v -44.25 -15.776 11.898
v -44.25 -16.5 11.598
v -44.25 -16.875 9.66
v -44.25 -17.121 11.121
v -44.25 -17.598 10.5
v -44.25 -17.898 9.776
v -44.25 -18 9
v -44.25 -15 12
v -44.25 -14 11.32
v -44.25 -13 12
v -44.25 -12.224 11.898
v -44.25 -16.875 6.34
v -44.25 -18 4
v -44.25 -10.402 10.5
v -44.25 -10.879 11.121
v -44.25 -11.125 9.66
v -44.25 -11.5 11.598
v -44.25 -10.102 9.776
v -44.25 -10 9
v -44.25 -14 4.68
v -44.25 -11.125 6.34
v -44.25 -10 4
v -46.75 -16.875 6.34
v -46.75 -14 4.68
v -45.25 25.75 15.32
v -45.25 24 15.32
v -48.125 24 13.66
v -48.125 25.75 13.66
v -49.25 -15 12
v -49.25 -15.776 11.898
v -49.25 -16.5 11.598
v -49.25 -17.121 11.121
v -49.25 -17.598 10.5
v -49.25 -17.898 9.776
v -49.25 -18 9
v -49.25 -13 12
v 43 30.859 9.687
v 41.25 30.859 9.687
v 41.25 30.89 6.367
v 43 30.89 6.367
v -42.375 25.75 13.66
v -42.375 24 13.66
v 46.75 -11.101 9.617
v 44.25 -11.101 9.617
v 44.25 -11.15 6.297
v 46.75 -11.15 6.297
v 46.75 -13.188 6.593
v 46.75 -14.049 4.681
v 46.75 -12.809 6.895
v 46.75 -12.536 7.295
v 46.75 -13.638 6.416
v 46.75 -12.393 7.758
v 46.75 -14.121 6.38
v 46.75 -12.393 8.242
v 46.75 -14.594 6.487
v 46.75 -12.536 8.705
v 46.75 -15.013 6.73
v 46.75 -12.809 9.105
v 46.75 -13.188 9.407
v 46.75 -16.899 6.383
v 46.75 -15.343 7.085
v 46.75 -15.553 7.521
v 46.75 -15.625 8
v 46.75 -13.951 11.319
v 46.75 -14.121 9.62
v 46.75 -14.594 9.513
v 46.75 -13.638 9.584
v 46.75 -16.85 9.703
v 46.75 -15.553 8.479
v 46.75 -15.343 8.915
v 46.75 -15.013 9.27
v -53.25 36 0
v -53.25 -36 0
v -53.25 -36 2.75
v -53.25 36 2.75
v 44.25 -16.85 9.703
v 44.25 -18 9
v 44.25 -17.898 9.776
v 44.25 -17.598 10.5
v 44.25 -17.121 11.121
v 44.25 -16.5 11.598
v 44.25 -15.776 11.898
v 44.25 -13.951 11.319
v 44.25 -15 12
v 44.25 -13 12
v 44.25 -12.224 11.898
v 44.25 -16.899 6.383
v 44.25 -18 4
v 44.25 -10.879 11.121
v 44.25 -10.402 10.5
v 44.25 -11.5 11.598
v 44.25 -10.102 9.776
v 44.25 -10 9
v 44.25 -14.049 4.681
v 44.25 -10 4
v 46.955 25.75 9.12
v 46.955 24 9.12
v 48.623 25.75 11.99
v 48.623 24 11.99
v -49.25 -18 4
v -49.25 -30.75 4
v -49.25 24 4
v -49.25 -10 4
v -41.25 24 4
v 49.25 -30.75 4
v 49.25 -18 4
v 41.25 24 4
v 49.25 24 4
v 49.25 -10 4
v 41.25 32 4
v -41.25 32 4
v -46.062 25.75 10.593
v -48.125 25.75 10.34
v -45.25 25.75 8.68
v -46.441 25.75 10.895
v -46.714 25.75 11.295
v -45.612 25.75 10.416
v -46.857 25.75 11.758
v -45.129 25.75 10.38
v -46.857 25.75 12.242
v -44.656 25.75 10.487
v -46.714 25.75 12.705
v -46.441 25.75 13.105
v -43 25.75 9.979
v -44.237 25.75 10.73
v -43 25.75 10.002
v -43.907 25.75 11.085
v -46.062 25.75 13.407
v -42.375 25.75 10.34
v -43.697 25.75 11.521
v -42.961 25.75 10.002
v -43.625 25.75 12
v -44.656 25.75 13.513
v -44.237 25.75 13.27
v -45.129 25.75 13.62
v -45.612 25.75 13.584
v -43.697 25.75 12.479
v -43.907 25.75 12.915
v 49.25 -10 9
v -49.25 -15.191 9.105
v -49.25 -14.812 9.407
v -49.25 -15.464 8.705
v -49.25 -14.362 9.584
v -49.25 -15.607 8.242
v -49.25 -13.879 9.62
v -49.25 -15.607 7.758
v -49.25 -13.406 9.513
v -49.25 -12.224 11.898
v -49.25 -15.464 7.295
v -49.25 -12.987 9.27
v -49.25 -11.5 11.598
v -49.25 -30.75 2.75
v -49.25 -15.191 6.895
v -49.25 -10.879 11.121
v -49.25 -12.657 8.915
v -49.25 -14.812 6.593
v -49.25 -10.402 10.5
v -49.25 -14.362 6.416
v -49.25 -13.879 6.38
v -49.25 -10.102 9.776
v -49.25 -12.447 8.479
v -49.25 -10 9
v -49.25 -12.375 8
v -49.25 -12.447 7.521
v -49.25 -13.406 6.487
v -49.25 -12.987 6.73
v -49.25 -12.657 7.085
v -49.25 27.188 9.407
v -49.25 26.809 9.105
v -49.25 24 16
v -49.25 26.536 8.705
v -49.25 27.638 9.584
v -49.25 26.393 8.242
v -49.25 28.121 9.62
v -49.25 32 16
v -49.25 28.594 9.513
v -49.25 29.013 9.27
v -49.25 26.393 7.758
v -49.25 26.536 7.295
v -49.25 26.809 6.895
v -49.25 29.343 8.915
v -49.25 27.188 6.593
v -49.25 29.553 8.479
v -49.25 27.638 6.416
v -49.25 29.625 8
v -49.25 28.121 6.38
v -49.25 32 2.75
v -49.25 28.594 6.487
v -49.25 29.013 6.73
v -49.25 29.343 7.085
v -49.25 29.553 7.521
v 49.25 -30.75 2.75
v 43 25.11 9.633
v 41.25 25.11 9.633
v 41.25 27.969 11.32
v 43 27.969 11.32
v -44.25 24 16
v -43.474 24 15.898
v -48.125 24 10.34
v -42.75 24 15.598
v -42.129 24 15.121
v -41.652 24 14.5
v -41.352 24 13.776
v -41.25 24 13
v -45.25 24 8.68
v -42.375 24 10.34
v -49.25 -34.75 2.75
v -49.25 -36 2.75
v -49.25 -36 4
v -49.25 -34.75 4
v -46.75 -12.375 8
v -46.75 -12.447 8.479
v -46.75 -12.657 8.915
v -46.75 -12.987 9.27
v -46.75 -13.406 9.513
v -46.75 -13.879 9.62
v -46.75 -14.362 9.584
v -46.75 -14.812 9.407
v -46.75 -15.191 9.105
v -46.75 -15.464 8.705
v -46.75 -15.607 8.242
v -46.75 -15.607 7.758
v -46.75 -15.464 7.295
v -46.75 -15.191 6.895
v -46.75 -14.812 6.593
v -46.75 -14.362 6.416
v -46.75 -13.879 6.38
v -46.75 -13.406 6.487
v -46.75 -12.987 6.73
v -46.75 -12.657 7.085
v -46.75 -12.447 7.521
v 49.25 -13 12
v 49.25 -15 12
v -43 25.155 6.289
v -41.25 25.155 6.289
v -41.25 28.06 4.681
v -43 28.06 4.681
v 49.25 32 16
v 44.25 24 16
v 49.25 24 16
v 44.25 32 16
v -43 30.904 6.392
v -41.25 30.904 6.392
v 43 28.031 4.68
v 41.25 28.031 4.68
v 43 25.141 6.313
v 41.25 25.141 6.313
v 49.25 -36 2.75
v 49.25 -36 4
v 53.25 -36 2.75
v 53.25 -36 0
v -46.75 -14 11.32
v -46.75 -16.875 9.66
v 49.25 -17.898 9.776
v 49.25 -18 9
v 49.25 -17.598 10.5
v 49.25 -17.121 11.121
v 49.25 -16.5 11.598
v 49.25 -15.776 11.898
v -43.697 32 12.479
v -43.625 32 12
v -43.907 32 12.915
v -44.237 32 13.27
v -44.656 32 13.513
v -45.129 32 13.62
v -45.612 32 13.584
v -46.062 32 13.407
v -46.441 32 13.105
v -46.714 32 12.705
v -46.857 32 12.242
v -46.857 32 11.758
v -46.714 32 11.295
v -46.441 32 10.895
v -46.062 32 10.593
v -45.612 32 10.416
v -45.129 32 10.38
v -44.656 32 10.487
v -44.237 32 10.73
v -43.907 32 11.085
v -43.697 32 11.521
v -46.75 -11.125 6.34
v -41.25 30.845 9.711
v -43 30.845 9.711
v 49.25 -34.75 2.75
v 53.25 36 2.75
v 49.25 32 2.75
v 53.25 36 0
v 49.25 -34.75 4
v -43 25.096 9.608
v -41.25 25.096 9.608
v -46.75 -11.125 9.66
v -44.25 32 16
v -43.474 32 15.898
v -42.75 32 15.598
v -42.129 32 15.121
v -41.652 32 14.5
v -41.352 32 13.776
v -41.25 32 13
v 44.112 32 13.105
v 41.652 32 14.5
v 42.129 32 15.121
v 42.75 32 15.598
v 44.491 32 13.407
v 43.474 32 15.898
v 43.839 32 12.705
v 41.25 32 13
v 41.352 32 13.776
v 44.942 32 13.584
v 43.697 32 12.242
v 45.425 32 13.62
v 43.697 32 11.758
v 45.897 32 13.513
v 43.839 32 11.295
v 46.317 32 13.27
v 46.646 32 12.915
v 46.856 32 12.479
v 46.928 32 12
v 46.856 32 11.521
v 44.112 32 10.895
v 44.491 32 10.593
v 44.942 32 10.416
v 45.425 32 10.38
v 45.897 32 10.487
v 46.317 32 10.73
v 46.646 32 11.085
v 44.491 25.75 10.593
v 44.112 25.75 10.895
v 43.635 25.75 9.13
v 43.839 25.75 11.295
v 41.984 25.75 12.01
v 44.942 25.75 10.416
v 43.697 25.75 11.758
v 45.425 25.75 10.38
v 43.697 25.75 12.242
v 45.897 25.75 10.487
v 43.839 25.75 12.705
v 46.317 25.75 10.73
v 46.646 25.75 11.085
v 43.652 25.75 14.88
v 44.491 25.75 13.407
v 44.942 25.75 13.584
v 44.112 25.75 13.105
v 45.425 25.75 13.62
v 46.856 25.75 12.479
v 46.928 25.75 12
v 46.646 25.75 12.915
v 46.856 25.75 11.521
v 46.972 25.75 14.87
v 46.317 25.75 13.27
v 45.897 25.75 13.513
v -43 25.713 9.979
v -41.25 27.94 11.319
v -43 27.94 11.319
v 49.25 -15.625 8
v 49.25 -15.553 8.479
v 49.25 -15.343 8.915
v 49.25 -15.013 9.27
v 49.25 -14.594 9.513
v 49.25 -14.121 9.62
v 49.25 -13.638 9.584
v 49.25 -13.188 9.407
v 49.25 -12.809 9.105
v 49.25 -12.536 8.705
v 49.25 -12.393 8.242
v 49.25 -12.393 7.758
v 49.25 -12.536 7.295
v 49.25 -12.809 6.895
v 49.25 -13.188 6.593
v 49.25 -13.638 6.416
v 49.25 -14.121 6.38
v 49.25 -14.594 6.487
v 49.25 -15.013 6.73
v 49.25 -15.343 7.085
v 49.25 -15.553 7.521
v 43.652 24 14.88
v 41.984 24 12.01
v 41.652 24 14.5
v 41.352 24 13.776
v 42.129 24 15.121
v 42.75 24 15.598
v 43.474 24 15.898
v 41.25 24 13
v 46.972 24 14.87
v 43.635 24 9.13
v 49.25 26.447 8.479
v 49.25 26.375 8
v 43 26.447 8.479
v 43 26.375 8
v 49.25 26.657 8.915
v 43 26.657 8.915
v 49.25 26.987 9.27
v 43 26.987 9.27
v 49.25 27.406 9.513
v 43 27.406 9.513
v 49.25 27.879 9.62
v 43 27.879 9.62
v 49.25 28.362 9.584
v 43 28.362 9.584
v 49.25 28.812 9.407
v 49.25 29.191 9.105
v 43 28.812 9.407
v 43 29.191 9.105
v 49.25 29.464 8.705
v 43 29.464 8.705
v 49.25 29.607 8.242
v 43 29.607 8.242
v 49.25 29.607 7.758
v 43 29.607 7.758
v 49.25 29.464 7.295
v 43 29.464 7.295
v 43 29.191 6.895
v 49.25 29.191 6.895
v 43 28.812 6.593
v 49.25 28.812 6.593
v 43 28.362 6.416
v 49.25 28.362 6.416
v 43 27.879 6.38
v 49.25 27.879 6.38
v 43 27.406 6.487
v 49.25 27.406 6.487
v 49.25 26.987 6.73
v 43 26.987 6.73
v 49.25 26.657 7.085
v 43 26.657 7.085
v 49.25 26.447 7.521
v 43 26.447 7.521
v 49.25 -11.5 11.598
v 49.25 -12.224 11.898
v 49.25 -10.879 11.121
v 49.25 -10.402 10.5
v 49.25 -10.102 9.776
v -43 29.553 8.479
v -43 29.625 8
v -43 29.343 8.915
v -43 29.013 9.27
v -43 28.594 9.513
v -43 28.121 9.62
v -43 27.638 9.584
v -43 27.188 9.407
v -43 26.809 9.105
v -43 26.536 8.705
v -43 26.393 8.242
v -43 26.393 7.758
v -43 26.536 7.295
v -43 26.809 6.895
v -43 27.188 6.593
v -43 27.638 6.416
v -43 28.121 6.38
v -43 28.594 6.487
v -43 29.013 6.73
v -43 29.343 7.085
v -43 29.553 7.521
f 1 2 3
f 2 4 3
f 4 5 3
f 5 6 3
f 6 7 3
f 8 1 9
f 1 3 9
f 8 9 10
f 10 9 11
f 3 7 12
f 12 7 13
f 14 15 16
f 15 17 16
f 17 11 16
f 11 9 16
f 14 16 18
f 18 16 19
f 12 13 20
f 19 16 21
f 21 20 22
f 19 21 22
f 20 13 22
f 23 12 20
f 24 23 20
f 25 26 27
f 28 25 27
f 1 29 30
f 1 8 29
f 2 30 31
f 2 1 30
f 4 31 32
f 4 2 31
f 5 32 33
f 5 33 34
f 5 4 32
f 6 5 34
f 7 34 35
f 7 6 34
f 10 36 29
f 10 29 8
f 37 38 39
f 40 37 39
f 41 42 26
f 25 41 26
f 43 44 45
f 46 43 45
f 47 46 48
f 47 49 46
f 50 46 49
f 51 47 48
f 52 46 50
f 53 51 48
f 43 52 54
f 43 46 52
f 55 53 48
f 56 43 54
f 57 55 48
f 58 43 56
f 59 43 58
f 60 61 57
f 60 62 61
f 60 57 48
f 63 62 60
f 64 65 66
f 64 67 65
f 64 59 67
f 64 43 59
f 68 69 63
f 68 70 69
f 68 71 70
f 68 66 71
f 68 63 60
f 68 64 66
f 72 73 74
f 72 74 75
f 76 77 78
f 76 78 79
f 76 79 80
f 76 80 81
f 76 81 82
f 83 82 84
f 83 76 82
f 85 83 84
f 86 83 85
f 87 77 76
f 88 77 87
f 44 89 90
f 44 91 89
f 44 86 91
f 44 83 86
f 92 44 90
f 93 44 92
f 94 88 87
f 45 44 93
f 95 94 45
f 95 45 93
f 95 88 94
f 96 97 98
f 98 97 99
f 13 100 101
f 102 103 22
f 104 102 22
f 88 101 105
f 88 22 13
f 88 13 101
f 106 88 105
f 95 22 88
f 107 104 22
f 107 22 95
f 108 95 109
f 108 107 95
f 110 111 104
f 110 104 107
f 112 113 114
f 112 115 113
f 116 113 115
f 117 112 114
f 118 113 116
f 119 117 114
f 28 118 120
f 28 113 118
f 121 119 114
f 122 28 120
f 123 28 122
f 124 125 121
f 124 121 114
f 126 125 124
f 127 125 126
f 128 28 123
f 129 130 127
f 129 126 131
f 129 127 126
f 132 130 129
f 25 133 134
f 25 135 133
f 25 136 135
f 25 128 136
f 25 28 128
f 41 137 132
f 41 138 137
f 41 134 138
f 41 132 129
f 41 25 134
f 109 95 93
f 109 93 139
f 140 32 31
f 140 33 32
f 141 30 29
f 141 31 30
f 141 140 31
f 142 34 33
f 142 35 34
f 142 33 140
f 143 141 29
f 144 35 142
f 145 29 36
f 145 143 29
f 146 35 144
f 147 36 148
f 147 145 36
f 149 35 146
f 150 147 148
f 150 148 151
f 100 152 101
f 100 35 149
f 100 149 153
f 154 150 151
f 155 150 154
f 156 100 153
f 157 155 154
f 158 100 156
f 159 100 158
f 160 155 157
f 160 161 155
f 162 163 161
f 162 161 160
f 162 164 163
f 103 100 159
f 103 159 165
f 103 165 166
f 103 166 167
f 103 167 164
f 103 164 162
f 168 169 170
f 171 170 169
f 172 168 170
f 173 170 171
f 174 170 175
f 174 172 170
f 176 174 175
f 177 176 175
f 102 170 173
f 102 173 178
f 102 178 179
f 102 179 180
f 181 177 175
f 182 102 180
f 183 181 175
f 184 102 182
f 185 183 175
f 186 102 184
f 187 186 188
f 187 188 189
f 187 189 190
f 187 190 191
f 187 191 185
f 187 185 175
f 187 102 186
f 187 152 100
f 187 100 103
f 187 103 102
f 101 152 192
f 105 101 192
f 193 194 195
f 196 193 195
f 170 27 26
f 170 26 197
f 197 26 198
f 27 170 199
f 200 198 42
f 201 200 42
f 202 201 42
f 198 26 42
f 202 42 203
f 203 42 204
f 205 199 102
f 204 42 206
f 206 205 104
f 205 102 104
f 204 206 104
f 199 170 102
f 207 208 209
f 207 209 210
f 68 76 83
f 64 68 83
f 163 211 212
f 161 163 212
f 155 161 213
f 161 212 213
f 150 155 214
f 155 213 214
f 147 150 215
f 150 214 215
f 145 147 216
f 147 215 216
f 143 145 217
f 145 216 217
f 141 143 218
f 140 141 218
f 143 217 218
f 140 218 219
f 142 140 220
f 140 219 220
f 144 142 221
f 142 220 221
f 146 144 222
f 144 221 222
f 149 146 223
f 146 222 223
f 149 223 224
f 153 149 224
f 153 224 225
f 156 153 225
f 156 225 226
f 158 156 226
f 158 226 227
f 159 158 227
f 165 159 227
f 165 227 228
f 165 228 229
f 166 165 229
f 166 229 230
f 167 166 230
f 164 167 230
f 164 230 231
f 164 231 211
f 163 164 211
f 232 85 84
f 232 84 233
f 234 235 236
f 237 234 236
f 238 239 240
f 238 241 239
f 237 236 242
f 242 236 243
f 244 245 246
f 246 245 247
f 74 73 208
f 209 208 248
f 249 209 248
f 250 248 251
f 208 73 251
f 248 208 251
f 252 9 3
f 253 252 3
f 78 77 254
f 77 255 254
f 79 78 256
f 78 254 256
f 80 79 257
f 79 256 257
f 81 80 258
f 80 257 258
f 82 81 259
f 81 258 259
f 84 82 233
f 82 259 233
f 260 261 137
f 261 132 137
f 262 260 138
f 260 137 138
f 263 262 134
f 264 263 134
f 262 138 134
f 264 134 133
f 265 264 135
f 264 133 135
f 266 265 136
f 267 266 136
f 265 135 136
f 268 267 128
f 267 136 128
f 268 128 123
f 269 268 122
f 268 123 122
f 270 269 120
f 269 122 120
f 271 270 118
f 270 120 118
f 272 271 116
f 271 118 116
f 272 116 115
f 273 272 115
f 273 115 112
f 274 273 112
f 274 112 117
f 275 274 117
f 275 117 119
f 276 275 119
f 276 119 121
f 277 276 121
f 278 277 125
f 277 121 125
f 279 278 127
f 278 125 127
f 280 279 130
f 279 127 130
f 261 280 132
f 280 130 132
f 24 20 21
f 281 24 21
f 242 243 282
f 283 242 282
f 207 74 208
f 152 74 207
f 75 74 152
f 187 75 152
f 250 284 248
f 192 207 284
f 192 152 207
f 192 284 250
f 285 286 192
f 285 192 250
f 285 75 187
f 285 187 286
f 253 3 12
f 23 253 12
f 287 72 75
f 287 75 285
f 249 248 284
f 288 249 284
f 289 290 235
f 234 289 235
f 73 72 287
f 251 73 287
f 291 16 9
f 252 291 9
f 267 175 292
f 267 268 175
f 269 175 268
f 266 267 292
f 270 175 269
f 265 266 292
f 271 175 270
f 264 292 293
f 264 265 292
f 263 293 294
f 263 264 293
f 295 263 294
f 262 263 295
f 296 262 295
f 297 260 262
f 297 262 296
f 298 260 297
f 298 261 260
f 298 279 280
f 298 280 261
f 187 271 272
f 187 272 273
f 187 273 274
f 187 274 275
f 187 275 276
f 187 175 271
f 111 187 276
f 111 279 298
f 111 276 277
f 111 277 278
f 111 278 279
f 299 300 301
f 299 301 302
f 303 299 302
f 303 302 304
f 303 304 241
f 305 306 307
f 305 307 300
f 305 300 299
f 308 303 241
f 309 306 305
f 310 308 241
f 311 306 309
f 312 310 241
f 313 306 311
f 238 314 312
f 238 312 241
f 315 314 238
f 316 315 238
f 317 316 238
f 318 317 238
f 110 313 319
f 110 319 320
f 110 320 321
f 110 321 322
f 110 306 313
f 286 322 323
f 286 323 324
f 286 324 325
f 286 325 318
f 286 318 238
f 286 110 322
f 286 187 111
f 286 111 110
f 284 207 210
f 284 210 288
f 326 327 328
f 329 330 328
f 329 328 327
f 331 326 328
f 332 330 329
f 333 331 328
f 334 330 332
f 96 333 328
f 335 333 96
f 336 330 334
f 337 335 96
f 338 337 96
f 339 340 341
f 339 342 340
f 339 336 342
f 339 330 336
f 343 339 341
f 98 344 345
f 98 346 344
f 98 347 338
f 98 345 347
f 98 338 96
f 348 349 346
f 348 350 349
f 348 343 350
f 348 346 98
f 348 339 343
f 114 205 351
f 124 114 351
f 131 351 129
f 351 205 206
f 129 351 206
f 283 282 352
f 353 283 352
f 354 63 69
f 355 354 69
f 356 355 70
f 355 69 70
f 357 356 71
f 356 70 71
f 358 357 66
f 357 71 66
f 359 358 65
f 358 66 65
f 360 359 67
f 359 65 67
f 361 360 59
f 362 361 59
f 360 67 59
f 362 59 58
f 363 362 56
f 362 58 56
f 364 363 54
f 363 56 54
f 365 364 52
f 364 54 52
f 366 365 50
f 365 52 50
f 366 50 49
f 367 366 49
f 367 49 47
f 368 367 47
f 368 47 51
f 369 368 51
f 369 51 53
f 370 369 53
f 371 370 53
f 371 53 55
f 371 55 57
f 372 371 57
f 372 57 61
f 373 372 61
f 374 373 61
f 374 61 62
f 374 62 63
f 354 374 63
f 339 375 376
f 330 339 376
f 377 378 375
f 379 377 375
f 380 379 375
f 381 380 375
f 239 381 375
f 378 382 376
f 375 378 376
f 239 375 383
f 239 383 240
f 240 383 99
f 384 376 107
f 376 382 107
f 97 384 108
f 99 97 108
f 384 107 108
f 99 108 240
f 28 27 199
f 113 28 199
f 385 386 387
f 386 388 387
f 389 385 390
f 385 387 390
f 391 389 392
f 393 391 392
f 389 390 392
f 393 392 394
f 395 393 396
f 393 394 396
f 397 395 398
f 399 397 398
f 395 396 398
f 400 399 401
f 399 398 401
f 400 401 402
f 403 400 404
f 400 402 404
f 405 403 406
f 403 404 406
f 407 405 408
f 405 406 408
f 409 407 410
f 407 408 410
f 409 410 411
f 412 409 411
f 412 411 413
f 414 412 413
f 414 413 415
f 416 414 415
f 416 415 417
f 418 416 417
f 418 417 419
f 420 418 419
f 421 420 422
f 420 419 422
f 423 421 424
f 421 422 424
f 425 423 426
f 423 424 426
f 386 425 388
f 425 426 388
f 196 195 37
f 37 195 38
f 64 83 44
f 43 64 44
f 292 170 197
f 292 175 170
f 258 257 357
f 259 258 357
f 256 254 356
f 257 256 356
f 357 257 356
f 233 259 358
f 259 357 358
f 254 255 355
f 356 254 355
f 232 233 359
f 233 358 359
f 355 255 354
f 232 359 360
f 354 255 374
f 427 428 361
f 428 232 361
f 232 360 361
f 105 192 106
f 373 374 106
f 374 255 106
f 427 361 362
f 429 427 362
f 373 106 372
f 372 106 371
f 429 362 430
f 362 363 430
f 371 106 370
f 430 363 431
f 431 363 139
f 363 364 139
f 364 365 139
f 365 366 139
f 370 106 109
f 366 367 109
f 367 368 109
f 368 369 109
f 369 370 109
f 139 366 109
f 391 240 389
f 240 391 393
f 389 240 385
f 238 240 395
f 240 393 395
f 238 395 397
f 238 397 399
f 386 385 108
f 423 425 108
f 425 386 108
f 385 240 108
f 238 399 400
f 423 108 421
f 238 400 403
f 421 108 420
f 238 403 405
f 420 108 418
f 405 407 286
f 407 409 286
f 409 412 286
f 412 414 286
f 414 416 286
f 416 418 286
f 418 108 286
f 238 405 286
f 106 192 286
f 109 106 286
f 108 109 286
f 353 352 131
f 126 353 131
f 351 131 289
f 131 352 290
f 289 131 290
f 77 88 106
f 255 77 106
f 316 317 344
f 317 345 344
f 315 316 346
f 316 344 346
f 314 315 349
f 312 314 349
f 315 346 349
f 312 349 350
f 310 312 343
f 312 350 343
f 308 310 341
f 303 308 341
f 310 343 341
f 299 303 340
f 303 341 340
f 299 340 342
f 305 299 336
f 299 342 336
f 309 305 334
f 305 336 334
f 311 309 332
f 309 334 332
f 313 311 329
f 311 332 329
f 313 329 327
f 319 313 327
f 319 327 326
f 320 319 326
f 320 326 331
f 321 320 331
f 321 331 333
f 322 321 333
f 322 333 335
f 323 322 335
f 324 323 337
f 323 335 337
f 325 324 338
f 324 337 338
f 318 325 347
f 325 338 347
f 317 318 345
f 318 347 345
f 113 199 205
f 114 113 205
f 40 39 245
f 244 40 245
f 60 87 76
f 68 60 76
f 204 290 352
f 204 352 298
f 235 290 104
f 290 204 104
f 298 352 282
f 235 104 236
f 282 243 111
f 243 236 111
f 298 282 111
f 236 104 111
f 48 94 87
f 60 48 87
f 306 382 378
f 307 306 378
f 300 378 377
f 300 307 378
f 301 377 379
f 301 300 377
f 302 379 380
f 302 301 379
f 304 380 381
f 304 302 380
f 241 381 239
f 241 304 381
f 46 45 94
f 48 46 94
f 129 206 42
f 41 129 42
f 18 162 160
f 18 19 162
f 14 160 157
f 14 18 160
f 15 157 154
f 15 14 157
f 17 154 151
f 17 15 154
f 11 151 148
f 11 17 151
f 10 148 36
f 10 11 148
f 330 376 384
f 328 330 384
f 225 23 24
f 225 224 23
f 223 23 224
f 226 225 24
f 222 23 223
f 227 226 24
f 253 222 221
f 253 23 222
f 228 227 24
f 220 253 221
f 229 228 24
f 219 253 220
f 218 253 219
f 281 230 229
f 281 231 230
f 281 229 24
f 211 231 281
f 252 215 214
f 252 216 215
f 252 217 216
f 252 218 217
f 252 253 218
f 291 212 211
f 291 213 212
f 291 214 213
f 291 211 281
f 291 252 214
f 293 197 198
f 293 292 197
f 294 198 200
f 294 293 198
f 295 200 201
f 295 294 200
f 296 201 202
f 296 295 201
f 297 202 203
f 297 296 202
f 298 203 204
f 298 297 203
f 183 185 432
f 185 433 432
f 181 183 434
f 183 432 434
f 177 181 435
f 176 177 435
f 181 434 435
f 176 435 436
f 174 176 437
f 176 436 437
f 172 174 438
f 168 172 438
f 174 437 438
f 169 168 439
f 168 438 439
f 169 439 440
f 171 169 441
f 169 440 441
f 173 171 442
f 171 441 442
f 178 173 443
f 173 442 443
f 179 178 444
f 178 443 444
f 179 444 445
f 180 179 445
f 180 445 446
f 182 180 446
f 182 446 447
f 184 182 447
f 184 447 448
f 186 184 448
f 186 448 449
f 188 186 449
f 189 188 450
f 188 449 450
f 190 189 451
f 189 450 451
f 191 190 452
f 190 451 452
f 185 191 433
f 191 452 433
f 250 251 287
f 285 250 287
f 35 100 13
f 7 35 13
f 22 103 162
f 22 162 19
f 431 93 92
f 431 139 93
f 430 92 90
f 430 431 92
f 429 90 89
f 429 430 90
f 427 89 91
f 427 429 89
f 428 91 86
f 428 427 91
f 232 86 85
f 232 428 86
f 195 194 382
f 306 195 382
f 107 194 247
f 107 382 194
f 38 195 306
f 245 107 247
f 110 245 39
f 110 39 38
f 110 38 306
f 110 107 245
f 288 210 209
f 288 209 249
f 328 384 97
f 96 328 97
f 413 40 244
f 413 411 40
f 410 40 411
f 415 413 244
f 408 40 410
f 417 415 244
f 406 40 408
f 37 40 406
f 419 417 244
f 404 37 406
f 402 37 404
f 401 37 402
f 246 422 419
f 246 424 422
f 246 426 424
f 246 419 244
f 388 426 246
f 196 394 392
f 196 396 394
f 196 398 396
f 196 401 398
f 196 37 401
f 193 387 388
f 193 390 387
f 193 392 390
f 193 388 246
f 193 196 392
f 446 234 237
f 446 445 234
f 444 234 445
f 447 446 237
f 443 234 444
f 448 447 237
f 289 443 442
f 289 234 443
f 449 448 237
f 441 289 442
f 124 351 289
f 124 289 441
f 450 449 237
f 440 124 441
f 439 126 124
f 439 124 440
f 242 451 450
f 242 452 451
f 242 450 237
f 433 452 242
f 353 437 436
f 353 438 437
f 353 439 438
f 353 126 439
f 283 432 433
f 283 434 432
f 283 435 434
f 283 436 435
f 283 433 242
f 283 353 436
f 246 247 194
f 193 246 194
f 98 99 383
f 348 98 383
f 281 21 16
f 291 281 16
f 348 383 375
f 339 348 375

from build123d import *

# Parameters (mm, degrees)
F0_W      = 106.5
F0_H      = 72
F1_DEPTH  = 2.75
F2_W      = 98.5
F2_H      = 62.75
F2_H_2    = 1.25
F3_DEPTH  = 1.25
F4_W      = 8
F4_H      = 8
F5_DEPTH  = 12
F6_W      = 5
F6_H      = 8
F7_DEPTH  = 8
F11_D     = 3.25
F11_DEPTH = 8
F12_D     = 3.25
F12_DEPTH = 8
F13_D     = 3.25
F13_DEPTH = 8
F15_DEPTH = 2.5
F17_DEPTH = 1.75
F19_DEPTH = 1.75
F21_DEPTH = 2.5
F23_DEPTH = 1.75
F25_DEPTH = 1.75
F26_R     = 3


with BuildPart() as f1:
    # F0 (on Top) → F1 (new body)
    with BuildSketch(Plane.XY):
        Rectangle(F0_W, F0_H)
    extrude(amount=F1_DEPTH)

    # F2 (on face) → F3 (join)
    with BuildSketch(Plane.XY.offset(2.75)):
        with Locations((0, 0.625)):
            Rectangle(F2_W, F2_H)
        with Locations((0, -35.375)):
            Rectangle(F2_W, F2_H_2)
    extrude(amount=F3_DEPTH)

    # F4 (on face) → F5 (join)
    with BuildSketch(Plane.XY.offset(4)):
        with Locations((-45.25, 28)):
            Rectangle(F4_W, F4_H)
        with Locations((45.25, 28)):
            Rectangle(F4_W, F4_H)
    extrude(amount=F5_DEPTH)

    # F6 (on face) → F7 (join)
    with BuildSketch(Plane.XY.offset(4)):
        with Locations((-46.75, -14)):
            Rectangle(F6_W, F6_H)
        with Locations((46.75, -14)):
            Rectangle(F6_W, F6_H)
    extrude(amount=F7_DEPTH)

    # F11
    with Locations(Plane(origin=(0, 32, 0), x_dir=(-1, 0, 0), z_dir=(0, 1, 0))):
        with Locations((-45.303469, 12), (45.25, 12)):
            Hole(F11_D / 2, depth=F11_DEPTH)

    # F12
    with Locations(Plane(origin=(-49.25, 0, 0), x_dir=(0, -1, 0), z_dir=(-1, 0, 0))):
        with Locations((-28, 8), (14, 8)):
            Hole(F12_D / 2, depth=F12_DEPTH)

    # F13
    with Locations(Plane.YZ.offset(49.25)):
        with Locations((-14, 8), (28, 8)):
            Hole(F13_D / 2, depth=F13_DEPTH)

    # F14 (on face) → F15 (cut)
    with BuildSketch(Plane.YZ.offset(-44.25)):
        Polygon((-11.125, 6.340118), (-11.125, 9.659882), (-14, 11.319764), (-16.875, 9.659882), (-16.875, 6.340118), (-14, 4.680236), align=None)
    extrude(amount=-F15_DEPTH, mode=Mode.SUBTRACT)

    # F16 (on face) → F17 (cut)
    with BuildSketch(Plane.YZ.offset(-41.25)):
        Polygon((30.844677, 9.711329), (27.940285, 11.319227), (25.095607, 9.607898), (25.155323, 6.288671), (28.059715, 4.680773), (30.904393, 6.392102), align=None)
    extrude(amount=-F17_DEPTH, mode=Mode.SUBTRACT)

    # F18 (on face) → F19 (cut)
    with BuildSketch(Plane(origin=(41.25, 0, 0), x_dir=(0, -1, 0), z_dir=(-1, 0, 0))):
        Polygon((-25.109566, 9.632858), (-27.968879, 11.319618), (-30.859313, 9.68676), (-30.890434, 6.367142), (-28.031121, 4.680382), (-25.140687, 6.31324), align=None)
    extrude(amount=-F19_DEPTH, mode=Mode.SUBTRACT)

    # F20 (on face) → F21 (cut)
    with BuildSketch(Plane(origin=(44.25, 0, 0), x_dir=(0, -1, 0), z_dir=(-1, 0, 0))):
        Polygon((13.950525, 11.319395), (11.100582, 9.616851), (11.150057, 6.297455), (14.049475, 4.680605), (16.899418, 6.383149), (16.849943, 9.702545), align=None)
    extrude(amount=-F21_DEPTH, mode=Mode.SUBTRACT)

    # F22 (on face) → F23 (cut)
    with BuildSketch(Plane.XZ.offset(-24)):
        Polygon((-42.375, 10.340118), (-42.375, 13.659882), (-45.25, 15.319764), (-48.125, 13.659882), (-48.125, 10.340118), (-45.25, 8.680236), align=None)
    extrude(amount=-F23_DEPTH, mode=Mode.SUBTRACT)

    # F24 (on face) → F25 (cut)
    with BuildSketch(Plane.XZ.offset(-24)):
        Polygon((41.983721, 12.010152), (43.634803, 9.130089), (46.954552, 9.119938), (48.623218, 11.989848), (46.972135, 14.869911), (43.652387, 14.880062), align=None)
    extrude(amount=-F25_DEPTH, mode=Mode.SUBTRACT)

    # F26
    f26_edges = [f1.edges().sort_by_distance(p)[0] for p in [
        (46.75, -18, 12),
        (46.75, -10, 12),
        (-46.75, -18, 12),
        (-46.75, -10, 12),
        (-41.25, 28, 16),
        (41.25, 28, 16),
    ]]
    fillet(f26_edges, radius=F26_R)


solid = f1.part
